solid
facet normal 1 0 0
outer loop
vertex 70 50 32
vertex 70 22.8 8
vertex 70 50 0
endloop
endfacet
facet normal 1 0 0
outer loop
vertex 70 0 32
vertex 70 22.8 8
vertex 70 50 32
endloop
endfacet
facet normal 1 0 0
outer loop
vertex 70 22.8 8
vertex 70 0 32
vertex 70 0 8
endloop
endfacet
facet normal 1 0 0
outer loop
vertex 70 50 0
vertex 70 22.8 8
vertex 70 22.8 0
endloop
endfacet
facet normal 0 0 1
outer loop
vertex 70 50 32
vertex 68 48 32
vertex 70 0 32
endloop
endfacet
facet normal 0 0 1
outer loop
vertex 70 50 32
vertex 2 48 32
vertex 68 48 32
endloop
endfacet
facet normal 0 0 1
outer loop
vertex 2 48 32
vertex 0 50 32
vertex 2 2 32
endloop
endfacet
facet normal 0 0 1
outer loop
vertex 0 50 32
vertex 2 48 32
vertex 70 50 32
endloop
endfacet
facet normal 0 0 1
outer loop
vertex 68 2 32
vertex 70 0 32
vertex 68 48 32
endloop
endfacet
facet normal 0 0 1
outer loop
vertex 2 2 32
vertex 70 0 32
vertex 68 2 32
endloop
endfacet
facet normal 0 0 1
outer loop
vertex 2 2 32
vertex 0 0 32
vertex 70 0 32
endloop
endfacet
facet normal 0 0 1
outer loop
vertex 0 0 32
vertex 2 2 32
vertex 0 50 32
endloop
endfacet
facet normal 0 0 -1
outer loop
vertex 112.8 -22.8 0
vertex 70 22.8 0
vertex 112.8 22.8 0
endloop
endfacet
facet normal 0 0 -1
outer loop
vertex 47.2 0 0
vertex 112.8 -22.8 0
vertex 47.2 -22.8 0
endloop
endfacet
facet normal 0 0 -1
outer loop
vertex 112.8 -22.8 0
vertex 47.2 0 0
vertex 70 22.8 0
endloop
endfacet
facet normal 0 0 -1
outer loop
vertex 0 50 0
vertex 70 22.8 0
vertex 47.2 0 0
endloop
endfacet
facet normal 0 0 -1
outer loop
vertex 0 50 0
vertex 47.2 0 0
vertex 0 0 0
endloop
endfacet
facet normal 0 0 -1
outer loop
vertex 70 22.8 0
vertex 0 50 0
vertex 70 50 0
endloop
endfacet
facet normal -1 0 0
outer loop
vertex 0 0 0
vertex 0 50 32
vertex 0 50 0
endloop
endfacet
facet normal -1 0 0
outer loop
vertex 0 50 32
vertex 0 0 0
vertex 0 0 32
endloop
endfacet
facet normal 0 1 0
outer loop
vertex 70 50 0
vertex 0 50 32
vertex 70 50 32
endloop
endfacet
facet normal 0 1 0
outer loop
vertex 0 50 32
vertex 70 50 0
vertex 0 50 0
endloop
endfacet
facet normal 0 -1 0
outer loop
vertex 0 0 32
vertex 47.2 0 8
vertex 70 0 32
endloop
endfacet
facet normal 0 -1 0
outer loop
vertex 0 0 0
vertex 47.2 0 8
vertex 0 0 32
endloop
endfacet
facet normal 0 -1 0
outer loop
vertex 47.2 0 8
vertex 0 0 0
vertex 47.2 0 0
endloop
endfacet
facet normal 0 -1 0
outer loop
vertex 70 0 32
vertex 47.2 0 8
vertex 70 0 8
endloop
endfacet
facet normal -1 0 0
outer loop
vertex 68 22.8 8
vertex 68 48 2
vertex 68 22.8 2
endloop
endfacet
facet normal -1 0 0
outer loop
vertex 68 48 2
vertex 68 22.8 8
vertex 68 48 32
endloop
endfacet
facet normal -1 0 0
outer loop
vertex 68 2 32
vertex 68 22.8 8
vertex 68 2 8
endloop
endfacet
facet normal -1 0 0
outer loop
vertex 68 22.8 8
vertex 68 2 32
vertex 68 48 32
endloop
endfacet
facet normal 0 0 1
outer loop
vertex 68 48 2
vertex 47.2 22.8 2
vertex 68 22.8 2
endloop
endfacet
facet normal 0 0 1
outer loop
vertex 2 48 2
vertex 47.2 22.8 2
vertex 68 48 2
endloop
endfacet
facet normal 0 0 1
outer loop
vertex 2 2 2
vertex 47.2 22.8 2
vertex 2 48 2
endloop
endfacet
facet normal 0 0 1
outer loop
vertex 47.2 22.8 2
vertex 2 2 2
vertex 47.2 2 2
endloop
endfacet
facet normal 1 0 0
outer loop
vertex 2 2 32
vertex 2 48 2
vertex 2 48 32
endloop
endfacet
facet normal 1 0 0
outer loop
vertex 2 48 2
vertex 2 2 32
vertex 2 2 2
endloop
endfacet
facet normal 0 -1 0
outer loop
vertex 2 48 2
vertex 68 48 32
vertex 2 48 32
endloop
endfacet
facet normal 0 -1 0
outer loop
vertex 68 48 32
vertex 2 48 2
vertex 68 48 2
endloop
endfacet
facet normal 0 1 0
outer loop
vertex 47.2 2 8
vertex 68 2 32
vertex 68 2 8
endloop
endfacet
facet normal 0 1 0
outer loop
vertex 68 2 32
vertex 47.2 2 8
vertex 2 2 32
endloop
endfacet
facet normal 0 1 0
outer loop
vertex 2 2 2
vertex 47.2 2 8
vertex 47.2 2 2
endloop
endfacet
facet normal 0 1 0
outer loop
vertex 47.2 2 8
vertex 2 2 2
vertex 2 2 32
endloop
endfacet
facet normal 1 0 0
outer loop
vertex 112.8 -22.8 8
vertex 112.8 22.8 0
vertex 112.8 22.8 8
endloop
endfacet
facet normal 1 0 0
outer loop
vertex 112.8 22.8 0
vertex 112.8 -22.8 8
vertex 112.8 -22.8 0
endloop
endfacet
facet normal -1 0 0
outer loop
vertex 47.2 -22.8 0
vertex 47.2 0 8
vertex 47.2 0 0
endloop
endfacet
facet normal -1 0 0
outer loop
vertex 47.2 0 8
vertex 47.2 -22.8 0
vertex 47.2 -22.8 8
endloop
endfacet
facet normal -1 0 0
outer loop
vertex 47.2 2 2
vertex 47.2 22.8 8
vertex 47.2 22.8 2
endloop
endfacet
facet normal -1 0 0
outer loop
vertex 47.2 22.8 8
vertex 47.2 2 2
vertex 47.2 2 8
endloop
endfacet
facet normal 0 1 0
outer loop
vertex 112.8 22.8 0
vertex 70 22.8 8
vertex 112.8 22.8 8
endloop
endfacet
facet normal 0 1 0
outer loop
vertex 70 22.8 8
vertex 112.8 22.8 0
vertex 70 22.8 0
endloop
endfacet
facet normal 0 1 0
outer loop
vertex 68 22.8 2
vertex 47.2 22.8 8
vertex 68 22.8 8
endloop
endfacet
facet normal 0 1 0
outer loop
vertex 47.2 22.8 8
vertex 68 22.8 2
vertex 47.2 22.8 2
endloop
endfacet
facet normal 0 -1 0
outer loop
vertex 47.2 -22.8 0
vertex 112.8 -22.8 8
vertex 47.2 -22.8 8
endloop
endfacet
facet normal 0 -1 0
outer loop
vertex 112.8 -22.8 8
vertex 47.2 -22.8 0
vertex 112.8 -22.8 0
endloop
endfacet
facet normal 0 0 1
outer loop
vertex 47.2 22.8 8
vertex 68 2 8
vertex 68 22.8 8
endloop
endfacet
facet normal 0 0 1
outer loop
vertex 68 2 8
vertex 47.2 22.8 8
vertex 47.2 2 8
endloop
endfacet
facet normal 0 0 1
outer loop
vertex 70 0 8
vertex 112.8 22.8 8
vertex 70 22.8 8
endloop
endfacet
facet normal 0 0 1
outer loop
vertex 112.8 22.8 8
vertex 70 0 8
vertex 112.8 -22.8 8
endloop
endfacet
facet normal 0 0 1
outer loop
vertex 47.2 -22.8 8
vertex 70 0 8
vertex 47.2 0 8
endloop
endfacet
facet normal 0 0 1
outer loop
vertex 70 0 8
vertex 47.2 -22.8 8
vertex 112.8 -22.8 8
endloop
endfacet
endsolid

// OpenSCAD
// Two-part enclosure for a small electronics board (e.g. Arduino-based temperature logger)
// Print orientation: both parts rest on the bed (z = 0), build upward, side by side.
// The lid is printed upside down: a flat plate with a rectangular lip on top that slides
// into the open-top box.

// ---------------- Parameters ----------------
box_x      = 70;    // box outer length (X)
box_y      = 50;    // box outer width (Y)
box_z      = 30;    // box outer height (Z)
box_wall   = 2;     // box wall thickness (sides and floor)
box_floor  = 2;     // box floor thickness (separate from side walls per the spec)

lip_t      = 1.5;   // lip wall thickness
lip_h      = 4;     // lip height above the plate
lip_x      = 65.6;  // outer lip size in X
lip_y      = 45.6;  // outer lip size in Y
lip_clear  = 0.2;   // clearance between lip inner edge and box opening on each side

plate_t    = 2;     // lid plate thickness
gap        = 10;    // gap between box and lid on the bed
eps        = 0.5;   // cutter overshoot past faces

$fn = 64;

// ---------------- Derived ----------------
box_inner_x = box_x - 2 * box_wall;   // 66.0
box_inner_y = box_y - 2 * box_wall;   // 46.0
// lip inner size = box inner size - 2 * clearance
lip_in_x = box_inner_x - 2 * lip_clear; // 65.2
lip_in_y = box_inner_y - 2 * lip_clear; // 45.2

// ---------------- Model ----------------
union() {
    // Part 1: Box (open top)
    difference() {
        cube([box_x, box_y, box_z + box_floor]);
        // open-top cavity
        translate([box_wall, box_wall, box_floor])
            cube([box_inner_x, box_inner_y, box_z + eps]);
    }

    // Part 2: Lid (plate with top lip), placed on the +X side of the box
    translate([box_x + gap, 0, 0])
        union() {
            // plate lying on the bed
            translate([-lip_x / 2, -lip_y / 2, 0])
                cube([lip_x, lip_y, plate_t]);
            // rectangular lip on top of the plate
            translate([-lip_x / 2, -lip_y / 2, plate_t])
                cube([lip_in_x, lip_in_y, plate_t + lip_h]);
        }
}
